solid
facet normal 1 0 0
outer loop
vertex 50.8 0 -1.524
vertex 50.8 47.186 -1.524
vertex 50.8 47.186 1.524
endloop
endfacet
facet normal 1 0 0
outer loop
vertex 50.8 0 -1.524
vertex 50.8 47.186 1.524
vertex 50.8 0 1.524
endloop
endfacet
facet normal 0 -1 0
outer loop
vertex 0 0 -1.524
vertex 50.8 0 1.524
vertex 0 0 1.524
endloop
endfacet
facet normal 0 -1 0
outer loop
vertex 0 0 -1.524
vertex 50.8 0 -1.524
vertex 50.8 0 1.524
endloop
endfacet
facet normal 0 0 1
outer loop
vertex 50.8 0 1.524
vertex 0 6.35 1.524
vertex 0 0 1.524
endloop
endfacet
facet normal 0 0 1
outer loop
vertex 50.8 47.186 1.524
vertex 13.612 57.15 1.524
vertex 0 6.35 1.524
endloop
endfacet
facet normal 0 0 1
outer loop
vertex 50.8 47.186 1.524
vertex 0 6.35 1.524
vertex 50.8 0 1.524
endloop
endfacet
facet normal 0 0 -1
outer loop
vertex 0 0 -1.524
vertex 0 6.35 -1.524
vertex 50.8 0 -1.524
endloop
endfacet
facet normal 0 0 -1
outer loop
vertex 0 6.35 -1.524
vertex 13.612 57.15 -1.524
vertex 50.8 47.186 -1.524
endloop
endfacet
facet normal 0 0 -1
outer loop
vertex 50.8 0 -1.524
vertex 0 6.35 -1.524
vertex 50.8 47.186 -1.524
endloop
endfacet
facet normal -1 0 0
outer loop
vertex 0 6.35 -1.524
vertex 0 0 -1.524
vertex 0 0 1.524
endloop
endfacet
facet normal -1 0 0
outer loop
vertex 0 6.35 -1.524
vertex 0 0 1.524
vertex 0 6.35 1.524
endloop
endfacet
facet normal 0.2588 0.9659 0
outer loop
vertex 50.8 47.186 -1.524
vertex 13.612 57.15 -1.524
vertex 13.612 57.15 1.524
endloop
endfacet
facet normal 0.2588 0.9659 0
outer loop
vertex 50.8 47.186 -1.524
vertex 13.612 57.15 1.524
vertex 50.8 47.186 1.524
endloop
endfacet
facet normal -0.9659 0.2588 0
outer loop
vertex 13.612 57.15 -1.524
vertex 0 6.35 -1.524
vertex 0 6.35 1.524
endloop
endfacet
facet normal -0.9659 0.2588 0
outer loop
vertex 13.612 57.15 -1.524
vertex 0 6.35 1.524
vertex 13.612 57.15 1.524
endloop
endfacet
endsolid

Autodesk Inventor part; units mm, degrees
ref_plane "YZ Plane" through (0, 0, 0) normal (1, 0, 0) x (0, 1, 0)
ref_plane "XZ Plane" through (0, 0, 0) normal (0, 1, 0) x (-1, 0, 0)
ref_plane "XY Plane" through (0, 0, 0) normal (0, 0, 1) x (1, 0, 0)
sketch "Sketch1" plane through (0, 0, 0) normal (0, 0, 1) x (1, 0, 0)
  line L0 (0, 0) -> (0, 6.35)
  line L1 (0, 6.35) -> (13.6118, 57.15)
  line L2 (13.6118, 57.15) -> (50.8, 47.1855)
  line L3 (50.8, 47.1855) -> (50.8, 0)
  line L4 (50.8, 0) -> (0, 0)
  dimension "d0" = 50.8
  dimension "d1" = 6.35
  dimension "d2" = 15
  dimension "d3" = 57.15
extrude "Extrusion1" add sketch "Sketch1" along normal mid plane 3.048
properties part number "A1-18002-100-54 Tube stop" material "Steel, Mild"
